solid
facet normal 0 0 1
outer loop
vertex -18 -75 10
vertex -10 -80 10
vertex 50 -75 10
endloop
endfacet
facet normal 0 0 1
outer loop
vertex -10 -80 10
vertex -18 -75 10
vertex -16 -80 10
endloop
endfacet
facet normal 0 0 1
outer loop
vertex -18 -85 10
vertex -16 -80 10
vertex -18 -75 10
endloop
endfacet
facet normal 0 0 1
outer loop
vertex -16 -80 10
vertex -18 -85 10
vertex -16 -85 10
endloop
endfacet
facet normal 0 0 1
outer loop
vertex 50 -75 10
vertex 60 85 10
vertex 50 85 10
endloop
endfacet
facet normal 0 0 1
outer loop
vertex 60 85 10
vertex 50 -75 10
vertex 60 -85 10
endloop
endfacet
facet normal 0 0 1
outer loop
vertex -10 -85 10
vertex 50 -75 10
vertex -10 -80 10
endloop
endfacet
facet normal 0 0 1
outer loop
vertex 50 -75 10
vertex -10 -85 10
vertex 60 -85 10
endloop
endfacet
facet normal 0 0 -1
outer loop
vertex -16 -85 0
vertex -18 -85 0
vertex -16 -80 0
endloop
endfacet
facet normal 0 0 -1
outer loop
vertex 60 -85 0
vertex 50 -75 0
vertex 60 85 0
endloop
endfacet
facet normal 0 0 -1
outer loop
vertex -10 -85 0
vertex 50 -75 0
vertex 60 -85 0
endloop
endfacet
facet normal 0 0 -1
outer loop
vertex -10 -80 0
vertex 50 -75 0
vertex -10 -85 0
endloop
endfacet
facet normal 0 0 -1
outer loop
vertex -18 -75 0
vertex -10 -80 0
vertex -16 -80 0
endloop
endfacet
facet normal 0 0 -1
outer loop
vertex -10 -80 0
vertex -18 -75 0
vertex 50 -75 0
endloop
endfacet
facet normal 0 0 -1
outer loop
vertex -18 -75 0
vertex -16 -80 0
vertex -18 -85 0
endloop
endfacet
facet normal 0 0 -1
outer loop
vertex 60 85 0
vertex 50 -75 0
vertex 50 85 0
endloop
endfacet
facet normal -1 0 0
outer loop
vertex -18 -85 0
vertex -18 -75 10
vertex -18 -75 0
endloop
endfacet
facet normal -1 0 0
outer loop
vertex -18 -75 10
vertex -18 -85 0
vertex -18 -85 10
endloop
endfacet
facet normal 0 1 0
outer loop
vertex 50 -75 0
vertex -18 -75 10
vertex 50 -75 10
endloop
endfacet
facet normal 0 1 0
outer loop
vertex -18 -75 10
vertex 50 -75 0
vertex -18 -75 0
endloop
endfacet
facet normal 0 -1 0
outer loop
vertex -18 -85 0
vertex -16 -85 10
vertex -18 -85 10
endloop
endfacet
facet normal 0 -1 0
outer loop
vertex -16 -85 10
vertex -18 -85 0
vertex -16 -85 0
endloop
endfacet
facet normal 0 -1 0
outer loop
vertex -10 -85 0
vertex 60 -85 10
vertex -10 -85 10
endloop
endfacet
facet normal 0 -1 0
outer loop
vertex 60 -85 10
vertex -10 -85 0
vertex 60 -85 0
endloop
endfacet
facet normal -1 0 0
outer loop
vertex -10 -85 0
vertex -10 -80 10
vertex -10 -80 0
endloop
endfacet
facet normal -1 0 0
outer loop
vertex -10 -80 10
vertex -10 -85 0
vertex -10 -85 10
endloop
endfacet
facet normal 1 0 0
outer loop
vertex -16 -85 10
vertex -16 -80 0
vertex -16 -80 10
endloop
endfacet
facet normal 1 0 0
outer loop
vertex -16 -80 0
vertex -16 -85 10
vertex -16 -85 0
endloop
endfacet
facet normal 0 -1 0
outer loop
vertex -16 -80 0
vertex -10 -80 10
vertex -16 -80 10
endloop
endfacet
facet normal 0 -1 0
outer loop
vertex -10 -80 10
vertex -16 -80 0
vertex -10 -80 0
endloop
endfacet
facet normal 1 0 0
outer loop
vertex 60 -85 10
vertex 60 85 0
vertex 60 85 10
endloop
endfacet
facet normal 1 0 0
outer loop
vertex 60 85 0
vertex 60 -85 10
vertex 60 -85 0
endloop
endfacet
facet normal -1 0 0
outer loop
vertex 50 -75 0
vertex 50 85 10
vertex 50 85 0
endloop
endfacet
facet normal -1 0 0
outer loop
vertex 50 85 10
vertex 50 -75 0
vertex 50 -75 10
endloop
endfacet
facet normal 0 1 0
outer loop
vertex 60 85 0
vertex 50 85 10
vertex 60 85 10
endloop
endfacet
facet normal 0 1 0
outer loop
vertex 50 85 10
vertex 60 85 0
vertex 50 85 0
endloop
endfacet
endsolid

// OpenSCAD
$fn = 90;

stand_diameter = 75;
stand_heigth = 170;
pole_diameter = 10;
/*
difference() {
    translate([0, 0, 0]) {
        translate([0, 0, 3]) cylinder(d1 = stand_diameter, d2 = pole_diameter, h = pole_diameter);
        cylinder(d = stand_diameter, h = 3);
    }
    cube([10.1, 10.1, 50], true);
    translate([0, 0, 14]) cube([40, 40, 10], true);
}
*/

translate([50, -stand_heigth/2, 0]) cube([10, stand_heigth, 10]);

translate([-18, -stand_heigth/2, 0]) 
    difference() {
        cube([70, 10, 10]);
        translate([2, -1, -5]) cube([6, 6, 20]);
    }
